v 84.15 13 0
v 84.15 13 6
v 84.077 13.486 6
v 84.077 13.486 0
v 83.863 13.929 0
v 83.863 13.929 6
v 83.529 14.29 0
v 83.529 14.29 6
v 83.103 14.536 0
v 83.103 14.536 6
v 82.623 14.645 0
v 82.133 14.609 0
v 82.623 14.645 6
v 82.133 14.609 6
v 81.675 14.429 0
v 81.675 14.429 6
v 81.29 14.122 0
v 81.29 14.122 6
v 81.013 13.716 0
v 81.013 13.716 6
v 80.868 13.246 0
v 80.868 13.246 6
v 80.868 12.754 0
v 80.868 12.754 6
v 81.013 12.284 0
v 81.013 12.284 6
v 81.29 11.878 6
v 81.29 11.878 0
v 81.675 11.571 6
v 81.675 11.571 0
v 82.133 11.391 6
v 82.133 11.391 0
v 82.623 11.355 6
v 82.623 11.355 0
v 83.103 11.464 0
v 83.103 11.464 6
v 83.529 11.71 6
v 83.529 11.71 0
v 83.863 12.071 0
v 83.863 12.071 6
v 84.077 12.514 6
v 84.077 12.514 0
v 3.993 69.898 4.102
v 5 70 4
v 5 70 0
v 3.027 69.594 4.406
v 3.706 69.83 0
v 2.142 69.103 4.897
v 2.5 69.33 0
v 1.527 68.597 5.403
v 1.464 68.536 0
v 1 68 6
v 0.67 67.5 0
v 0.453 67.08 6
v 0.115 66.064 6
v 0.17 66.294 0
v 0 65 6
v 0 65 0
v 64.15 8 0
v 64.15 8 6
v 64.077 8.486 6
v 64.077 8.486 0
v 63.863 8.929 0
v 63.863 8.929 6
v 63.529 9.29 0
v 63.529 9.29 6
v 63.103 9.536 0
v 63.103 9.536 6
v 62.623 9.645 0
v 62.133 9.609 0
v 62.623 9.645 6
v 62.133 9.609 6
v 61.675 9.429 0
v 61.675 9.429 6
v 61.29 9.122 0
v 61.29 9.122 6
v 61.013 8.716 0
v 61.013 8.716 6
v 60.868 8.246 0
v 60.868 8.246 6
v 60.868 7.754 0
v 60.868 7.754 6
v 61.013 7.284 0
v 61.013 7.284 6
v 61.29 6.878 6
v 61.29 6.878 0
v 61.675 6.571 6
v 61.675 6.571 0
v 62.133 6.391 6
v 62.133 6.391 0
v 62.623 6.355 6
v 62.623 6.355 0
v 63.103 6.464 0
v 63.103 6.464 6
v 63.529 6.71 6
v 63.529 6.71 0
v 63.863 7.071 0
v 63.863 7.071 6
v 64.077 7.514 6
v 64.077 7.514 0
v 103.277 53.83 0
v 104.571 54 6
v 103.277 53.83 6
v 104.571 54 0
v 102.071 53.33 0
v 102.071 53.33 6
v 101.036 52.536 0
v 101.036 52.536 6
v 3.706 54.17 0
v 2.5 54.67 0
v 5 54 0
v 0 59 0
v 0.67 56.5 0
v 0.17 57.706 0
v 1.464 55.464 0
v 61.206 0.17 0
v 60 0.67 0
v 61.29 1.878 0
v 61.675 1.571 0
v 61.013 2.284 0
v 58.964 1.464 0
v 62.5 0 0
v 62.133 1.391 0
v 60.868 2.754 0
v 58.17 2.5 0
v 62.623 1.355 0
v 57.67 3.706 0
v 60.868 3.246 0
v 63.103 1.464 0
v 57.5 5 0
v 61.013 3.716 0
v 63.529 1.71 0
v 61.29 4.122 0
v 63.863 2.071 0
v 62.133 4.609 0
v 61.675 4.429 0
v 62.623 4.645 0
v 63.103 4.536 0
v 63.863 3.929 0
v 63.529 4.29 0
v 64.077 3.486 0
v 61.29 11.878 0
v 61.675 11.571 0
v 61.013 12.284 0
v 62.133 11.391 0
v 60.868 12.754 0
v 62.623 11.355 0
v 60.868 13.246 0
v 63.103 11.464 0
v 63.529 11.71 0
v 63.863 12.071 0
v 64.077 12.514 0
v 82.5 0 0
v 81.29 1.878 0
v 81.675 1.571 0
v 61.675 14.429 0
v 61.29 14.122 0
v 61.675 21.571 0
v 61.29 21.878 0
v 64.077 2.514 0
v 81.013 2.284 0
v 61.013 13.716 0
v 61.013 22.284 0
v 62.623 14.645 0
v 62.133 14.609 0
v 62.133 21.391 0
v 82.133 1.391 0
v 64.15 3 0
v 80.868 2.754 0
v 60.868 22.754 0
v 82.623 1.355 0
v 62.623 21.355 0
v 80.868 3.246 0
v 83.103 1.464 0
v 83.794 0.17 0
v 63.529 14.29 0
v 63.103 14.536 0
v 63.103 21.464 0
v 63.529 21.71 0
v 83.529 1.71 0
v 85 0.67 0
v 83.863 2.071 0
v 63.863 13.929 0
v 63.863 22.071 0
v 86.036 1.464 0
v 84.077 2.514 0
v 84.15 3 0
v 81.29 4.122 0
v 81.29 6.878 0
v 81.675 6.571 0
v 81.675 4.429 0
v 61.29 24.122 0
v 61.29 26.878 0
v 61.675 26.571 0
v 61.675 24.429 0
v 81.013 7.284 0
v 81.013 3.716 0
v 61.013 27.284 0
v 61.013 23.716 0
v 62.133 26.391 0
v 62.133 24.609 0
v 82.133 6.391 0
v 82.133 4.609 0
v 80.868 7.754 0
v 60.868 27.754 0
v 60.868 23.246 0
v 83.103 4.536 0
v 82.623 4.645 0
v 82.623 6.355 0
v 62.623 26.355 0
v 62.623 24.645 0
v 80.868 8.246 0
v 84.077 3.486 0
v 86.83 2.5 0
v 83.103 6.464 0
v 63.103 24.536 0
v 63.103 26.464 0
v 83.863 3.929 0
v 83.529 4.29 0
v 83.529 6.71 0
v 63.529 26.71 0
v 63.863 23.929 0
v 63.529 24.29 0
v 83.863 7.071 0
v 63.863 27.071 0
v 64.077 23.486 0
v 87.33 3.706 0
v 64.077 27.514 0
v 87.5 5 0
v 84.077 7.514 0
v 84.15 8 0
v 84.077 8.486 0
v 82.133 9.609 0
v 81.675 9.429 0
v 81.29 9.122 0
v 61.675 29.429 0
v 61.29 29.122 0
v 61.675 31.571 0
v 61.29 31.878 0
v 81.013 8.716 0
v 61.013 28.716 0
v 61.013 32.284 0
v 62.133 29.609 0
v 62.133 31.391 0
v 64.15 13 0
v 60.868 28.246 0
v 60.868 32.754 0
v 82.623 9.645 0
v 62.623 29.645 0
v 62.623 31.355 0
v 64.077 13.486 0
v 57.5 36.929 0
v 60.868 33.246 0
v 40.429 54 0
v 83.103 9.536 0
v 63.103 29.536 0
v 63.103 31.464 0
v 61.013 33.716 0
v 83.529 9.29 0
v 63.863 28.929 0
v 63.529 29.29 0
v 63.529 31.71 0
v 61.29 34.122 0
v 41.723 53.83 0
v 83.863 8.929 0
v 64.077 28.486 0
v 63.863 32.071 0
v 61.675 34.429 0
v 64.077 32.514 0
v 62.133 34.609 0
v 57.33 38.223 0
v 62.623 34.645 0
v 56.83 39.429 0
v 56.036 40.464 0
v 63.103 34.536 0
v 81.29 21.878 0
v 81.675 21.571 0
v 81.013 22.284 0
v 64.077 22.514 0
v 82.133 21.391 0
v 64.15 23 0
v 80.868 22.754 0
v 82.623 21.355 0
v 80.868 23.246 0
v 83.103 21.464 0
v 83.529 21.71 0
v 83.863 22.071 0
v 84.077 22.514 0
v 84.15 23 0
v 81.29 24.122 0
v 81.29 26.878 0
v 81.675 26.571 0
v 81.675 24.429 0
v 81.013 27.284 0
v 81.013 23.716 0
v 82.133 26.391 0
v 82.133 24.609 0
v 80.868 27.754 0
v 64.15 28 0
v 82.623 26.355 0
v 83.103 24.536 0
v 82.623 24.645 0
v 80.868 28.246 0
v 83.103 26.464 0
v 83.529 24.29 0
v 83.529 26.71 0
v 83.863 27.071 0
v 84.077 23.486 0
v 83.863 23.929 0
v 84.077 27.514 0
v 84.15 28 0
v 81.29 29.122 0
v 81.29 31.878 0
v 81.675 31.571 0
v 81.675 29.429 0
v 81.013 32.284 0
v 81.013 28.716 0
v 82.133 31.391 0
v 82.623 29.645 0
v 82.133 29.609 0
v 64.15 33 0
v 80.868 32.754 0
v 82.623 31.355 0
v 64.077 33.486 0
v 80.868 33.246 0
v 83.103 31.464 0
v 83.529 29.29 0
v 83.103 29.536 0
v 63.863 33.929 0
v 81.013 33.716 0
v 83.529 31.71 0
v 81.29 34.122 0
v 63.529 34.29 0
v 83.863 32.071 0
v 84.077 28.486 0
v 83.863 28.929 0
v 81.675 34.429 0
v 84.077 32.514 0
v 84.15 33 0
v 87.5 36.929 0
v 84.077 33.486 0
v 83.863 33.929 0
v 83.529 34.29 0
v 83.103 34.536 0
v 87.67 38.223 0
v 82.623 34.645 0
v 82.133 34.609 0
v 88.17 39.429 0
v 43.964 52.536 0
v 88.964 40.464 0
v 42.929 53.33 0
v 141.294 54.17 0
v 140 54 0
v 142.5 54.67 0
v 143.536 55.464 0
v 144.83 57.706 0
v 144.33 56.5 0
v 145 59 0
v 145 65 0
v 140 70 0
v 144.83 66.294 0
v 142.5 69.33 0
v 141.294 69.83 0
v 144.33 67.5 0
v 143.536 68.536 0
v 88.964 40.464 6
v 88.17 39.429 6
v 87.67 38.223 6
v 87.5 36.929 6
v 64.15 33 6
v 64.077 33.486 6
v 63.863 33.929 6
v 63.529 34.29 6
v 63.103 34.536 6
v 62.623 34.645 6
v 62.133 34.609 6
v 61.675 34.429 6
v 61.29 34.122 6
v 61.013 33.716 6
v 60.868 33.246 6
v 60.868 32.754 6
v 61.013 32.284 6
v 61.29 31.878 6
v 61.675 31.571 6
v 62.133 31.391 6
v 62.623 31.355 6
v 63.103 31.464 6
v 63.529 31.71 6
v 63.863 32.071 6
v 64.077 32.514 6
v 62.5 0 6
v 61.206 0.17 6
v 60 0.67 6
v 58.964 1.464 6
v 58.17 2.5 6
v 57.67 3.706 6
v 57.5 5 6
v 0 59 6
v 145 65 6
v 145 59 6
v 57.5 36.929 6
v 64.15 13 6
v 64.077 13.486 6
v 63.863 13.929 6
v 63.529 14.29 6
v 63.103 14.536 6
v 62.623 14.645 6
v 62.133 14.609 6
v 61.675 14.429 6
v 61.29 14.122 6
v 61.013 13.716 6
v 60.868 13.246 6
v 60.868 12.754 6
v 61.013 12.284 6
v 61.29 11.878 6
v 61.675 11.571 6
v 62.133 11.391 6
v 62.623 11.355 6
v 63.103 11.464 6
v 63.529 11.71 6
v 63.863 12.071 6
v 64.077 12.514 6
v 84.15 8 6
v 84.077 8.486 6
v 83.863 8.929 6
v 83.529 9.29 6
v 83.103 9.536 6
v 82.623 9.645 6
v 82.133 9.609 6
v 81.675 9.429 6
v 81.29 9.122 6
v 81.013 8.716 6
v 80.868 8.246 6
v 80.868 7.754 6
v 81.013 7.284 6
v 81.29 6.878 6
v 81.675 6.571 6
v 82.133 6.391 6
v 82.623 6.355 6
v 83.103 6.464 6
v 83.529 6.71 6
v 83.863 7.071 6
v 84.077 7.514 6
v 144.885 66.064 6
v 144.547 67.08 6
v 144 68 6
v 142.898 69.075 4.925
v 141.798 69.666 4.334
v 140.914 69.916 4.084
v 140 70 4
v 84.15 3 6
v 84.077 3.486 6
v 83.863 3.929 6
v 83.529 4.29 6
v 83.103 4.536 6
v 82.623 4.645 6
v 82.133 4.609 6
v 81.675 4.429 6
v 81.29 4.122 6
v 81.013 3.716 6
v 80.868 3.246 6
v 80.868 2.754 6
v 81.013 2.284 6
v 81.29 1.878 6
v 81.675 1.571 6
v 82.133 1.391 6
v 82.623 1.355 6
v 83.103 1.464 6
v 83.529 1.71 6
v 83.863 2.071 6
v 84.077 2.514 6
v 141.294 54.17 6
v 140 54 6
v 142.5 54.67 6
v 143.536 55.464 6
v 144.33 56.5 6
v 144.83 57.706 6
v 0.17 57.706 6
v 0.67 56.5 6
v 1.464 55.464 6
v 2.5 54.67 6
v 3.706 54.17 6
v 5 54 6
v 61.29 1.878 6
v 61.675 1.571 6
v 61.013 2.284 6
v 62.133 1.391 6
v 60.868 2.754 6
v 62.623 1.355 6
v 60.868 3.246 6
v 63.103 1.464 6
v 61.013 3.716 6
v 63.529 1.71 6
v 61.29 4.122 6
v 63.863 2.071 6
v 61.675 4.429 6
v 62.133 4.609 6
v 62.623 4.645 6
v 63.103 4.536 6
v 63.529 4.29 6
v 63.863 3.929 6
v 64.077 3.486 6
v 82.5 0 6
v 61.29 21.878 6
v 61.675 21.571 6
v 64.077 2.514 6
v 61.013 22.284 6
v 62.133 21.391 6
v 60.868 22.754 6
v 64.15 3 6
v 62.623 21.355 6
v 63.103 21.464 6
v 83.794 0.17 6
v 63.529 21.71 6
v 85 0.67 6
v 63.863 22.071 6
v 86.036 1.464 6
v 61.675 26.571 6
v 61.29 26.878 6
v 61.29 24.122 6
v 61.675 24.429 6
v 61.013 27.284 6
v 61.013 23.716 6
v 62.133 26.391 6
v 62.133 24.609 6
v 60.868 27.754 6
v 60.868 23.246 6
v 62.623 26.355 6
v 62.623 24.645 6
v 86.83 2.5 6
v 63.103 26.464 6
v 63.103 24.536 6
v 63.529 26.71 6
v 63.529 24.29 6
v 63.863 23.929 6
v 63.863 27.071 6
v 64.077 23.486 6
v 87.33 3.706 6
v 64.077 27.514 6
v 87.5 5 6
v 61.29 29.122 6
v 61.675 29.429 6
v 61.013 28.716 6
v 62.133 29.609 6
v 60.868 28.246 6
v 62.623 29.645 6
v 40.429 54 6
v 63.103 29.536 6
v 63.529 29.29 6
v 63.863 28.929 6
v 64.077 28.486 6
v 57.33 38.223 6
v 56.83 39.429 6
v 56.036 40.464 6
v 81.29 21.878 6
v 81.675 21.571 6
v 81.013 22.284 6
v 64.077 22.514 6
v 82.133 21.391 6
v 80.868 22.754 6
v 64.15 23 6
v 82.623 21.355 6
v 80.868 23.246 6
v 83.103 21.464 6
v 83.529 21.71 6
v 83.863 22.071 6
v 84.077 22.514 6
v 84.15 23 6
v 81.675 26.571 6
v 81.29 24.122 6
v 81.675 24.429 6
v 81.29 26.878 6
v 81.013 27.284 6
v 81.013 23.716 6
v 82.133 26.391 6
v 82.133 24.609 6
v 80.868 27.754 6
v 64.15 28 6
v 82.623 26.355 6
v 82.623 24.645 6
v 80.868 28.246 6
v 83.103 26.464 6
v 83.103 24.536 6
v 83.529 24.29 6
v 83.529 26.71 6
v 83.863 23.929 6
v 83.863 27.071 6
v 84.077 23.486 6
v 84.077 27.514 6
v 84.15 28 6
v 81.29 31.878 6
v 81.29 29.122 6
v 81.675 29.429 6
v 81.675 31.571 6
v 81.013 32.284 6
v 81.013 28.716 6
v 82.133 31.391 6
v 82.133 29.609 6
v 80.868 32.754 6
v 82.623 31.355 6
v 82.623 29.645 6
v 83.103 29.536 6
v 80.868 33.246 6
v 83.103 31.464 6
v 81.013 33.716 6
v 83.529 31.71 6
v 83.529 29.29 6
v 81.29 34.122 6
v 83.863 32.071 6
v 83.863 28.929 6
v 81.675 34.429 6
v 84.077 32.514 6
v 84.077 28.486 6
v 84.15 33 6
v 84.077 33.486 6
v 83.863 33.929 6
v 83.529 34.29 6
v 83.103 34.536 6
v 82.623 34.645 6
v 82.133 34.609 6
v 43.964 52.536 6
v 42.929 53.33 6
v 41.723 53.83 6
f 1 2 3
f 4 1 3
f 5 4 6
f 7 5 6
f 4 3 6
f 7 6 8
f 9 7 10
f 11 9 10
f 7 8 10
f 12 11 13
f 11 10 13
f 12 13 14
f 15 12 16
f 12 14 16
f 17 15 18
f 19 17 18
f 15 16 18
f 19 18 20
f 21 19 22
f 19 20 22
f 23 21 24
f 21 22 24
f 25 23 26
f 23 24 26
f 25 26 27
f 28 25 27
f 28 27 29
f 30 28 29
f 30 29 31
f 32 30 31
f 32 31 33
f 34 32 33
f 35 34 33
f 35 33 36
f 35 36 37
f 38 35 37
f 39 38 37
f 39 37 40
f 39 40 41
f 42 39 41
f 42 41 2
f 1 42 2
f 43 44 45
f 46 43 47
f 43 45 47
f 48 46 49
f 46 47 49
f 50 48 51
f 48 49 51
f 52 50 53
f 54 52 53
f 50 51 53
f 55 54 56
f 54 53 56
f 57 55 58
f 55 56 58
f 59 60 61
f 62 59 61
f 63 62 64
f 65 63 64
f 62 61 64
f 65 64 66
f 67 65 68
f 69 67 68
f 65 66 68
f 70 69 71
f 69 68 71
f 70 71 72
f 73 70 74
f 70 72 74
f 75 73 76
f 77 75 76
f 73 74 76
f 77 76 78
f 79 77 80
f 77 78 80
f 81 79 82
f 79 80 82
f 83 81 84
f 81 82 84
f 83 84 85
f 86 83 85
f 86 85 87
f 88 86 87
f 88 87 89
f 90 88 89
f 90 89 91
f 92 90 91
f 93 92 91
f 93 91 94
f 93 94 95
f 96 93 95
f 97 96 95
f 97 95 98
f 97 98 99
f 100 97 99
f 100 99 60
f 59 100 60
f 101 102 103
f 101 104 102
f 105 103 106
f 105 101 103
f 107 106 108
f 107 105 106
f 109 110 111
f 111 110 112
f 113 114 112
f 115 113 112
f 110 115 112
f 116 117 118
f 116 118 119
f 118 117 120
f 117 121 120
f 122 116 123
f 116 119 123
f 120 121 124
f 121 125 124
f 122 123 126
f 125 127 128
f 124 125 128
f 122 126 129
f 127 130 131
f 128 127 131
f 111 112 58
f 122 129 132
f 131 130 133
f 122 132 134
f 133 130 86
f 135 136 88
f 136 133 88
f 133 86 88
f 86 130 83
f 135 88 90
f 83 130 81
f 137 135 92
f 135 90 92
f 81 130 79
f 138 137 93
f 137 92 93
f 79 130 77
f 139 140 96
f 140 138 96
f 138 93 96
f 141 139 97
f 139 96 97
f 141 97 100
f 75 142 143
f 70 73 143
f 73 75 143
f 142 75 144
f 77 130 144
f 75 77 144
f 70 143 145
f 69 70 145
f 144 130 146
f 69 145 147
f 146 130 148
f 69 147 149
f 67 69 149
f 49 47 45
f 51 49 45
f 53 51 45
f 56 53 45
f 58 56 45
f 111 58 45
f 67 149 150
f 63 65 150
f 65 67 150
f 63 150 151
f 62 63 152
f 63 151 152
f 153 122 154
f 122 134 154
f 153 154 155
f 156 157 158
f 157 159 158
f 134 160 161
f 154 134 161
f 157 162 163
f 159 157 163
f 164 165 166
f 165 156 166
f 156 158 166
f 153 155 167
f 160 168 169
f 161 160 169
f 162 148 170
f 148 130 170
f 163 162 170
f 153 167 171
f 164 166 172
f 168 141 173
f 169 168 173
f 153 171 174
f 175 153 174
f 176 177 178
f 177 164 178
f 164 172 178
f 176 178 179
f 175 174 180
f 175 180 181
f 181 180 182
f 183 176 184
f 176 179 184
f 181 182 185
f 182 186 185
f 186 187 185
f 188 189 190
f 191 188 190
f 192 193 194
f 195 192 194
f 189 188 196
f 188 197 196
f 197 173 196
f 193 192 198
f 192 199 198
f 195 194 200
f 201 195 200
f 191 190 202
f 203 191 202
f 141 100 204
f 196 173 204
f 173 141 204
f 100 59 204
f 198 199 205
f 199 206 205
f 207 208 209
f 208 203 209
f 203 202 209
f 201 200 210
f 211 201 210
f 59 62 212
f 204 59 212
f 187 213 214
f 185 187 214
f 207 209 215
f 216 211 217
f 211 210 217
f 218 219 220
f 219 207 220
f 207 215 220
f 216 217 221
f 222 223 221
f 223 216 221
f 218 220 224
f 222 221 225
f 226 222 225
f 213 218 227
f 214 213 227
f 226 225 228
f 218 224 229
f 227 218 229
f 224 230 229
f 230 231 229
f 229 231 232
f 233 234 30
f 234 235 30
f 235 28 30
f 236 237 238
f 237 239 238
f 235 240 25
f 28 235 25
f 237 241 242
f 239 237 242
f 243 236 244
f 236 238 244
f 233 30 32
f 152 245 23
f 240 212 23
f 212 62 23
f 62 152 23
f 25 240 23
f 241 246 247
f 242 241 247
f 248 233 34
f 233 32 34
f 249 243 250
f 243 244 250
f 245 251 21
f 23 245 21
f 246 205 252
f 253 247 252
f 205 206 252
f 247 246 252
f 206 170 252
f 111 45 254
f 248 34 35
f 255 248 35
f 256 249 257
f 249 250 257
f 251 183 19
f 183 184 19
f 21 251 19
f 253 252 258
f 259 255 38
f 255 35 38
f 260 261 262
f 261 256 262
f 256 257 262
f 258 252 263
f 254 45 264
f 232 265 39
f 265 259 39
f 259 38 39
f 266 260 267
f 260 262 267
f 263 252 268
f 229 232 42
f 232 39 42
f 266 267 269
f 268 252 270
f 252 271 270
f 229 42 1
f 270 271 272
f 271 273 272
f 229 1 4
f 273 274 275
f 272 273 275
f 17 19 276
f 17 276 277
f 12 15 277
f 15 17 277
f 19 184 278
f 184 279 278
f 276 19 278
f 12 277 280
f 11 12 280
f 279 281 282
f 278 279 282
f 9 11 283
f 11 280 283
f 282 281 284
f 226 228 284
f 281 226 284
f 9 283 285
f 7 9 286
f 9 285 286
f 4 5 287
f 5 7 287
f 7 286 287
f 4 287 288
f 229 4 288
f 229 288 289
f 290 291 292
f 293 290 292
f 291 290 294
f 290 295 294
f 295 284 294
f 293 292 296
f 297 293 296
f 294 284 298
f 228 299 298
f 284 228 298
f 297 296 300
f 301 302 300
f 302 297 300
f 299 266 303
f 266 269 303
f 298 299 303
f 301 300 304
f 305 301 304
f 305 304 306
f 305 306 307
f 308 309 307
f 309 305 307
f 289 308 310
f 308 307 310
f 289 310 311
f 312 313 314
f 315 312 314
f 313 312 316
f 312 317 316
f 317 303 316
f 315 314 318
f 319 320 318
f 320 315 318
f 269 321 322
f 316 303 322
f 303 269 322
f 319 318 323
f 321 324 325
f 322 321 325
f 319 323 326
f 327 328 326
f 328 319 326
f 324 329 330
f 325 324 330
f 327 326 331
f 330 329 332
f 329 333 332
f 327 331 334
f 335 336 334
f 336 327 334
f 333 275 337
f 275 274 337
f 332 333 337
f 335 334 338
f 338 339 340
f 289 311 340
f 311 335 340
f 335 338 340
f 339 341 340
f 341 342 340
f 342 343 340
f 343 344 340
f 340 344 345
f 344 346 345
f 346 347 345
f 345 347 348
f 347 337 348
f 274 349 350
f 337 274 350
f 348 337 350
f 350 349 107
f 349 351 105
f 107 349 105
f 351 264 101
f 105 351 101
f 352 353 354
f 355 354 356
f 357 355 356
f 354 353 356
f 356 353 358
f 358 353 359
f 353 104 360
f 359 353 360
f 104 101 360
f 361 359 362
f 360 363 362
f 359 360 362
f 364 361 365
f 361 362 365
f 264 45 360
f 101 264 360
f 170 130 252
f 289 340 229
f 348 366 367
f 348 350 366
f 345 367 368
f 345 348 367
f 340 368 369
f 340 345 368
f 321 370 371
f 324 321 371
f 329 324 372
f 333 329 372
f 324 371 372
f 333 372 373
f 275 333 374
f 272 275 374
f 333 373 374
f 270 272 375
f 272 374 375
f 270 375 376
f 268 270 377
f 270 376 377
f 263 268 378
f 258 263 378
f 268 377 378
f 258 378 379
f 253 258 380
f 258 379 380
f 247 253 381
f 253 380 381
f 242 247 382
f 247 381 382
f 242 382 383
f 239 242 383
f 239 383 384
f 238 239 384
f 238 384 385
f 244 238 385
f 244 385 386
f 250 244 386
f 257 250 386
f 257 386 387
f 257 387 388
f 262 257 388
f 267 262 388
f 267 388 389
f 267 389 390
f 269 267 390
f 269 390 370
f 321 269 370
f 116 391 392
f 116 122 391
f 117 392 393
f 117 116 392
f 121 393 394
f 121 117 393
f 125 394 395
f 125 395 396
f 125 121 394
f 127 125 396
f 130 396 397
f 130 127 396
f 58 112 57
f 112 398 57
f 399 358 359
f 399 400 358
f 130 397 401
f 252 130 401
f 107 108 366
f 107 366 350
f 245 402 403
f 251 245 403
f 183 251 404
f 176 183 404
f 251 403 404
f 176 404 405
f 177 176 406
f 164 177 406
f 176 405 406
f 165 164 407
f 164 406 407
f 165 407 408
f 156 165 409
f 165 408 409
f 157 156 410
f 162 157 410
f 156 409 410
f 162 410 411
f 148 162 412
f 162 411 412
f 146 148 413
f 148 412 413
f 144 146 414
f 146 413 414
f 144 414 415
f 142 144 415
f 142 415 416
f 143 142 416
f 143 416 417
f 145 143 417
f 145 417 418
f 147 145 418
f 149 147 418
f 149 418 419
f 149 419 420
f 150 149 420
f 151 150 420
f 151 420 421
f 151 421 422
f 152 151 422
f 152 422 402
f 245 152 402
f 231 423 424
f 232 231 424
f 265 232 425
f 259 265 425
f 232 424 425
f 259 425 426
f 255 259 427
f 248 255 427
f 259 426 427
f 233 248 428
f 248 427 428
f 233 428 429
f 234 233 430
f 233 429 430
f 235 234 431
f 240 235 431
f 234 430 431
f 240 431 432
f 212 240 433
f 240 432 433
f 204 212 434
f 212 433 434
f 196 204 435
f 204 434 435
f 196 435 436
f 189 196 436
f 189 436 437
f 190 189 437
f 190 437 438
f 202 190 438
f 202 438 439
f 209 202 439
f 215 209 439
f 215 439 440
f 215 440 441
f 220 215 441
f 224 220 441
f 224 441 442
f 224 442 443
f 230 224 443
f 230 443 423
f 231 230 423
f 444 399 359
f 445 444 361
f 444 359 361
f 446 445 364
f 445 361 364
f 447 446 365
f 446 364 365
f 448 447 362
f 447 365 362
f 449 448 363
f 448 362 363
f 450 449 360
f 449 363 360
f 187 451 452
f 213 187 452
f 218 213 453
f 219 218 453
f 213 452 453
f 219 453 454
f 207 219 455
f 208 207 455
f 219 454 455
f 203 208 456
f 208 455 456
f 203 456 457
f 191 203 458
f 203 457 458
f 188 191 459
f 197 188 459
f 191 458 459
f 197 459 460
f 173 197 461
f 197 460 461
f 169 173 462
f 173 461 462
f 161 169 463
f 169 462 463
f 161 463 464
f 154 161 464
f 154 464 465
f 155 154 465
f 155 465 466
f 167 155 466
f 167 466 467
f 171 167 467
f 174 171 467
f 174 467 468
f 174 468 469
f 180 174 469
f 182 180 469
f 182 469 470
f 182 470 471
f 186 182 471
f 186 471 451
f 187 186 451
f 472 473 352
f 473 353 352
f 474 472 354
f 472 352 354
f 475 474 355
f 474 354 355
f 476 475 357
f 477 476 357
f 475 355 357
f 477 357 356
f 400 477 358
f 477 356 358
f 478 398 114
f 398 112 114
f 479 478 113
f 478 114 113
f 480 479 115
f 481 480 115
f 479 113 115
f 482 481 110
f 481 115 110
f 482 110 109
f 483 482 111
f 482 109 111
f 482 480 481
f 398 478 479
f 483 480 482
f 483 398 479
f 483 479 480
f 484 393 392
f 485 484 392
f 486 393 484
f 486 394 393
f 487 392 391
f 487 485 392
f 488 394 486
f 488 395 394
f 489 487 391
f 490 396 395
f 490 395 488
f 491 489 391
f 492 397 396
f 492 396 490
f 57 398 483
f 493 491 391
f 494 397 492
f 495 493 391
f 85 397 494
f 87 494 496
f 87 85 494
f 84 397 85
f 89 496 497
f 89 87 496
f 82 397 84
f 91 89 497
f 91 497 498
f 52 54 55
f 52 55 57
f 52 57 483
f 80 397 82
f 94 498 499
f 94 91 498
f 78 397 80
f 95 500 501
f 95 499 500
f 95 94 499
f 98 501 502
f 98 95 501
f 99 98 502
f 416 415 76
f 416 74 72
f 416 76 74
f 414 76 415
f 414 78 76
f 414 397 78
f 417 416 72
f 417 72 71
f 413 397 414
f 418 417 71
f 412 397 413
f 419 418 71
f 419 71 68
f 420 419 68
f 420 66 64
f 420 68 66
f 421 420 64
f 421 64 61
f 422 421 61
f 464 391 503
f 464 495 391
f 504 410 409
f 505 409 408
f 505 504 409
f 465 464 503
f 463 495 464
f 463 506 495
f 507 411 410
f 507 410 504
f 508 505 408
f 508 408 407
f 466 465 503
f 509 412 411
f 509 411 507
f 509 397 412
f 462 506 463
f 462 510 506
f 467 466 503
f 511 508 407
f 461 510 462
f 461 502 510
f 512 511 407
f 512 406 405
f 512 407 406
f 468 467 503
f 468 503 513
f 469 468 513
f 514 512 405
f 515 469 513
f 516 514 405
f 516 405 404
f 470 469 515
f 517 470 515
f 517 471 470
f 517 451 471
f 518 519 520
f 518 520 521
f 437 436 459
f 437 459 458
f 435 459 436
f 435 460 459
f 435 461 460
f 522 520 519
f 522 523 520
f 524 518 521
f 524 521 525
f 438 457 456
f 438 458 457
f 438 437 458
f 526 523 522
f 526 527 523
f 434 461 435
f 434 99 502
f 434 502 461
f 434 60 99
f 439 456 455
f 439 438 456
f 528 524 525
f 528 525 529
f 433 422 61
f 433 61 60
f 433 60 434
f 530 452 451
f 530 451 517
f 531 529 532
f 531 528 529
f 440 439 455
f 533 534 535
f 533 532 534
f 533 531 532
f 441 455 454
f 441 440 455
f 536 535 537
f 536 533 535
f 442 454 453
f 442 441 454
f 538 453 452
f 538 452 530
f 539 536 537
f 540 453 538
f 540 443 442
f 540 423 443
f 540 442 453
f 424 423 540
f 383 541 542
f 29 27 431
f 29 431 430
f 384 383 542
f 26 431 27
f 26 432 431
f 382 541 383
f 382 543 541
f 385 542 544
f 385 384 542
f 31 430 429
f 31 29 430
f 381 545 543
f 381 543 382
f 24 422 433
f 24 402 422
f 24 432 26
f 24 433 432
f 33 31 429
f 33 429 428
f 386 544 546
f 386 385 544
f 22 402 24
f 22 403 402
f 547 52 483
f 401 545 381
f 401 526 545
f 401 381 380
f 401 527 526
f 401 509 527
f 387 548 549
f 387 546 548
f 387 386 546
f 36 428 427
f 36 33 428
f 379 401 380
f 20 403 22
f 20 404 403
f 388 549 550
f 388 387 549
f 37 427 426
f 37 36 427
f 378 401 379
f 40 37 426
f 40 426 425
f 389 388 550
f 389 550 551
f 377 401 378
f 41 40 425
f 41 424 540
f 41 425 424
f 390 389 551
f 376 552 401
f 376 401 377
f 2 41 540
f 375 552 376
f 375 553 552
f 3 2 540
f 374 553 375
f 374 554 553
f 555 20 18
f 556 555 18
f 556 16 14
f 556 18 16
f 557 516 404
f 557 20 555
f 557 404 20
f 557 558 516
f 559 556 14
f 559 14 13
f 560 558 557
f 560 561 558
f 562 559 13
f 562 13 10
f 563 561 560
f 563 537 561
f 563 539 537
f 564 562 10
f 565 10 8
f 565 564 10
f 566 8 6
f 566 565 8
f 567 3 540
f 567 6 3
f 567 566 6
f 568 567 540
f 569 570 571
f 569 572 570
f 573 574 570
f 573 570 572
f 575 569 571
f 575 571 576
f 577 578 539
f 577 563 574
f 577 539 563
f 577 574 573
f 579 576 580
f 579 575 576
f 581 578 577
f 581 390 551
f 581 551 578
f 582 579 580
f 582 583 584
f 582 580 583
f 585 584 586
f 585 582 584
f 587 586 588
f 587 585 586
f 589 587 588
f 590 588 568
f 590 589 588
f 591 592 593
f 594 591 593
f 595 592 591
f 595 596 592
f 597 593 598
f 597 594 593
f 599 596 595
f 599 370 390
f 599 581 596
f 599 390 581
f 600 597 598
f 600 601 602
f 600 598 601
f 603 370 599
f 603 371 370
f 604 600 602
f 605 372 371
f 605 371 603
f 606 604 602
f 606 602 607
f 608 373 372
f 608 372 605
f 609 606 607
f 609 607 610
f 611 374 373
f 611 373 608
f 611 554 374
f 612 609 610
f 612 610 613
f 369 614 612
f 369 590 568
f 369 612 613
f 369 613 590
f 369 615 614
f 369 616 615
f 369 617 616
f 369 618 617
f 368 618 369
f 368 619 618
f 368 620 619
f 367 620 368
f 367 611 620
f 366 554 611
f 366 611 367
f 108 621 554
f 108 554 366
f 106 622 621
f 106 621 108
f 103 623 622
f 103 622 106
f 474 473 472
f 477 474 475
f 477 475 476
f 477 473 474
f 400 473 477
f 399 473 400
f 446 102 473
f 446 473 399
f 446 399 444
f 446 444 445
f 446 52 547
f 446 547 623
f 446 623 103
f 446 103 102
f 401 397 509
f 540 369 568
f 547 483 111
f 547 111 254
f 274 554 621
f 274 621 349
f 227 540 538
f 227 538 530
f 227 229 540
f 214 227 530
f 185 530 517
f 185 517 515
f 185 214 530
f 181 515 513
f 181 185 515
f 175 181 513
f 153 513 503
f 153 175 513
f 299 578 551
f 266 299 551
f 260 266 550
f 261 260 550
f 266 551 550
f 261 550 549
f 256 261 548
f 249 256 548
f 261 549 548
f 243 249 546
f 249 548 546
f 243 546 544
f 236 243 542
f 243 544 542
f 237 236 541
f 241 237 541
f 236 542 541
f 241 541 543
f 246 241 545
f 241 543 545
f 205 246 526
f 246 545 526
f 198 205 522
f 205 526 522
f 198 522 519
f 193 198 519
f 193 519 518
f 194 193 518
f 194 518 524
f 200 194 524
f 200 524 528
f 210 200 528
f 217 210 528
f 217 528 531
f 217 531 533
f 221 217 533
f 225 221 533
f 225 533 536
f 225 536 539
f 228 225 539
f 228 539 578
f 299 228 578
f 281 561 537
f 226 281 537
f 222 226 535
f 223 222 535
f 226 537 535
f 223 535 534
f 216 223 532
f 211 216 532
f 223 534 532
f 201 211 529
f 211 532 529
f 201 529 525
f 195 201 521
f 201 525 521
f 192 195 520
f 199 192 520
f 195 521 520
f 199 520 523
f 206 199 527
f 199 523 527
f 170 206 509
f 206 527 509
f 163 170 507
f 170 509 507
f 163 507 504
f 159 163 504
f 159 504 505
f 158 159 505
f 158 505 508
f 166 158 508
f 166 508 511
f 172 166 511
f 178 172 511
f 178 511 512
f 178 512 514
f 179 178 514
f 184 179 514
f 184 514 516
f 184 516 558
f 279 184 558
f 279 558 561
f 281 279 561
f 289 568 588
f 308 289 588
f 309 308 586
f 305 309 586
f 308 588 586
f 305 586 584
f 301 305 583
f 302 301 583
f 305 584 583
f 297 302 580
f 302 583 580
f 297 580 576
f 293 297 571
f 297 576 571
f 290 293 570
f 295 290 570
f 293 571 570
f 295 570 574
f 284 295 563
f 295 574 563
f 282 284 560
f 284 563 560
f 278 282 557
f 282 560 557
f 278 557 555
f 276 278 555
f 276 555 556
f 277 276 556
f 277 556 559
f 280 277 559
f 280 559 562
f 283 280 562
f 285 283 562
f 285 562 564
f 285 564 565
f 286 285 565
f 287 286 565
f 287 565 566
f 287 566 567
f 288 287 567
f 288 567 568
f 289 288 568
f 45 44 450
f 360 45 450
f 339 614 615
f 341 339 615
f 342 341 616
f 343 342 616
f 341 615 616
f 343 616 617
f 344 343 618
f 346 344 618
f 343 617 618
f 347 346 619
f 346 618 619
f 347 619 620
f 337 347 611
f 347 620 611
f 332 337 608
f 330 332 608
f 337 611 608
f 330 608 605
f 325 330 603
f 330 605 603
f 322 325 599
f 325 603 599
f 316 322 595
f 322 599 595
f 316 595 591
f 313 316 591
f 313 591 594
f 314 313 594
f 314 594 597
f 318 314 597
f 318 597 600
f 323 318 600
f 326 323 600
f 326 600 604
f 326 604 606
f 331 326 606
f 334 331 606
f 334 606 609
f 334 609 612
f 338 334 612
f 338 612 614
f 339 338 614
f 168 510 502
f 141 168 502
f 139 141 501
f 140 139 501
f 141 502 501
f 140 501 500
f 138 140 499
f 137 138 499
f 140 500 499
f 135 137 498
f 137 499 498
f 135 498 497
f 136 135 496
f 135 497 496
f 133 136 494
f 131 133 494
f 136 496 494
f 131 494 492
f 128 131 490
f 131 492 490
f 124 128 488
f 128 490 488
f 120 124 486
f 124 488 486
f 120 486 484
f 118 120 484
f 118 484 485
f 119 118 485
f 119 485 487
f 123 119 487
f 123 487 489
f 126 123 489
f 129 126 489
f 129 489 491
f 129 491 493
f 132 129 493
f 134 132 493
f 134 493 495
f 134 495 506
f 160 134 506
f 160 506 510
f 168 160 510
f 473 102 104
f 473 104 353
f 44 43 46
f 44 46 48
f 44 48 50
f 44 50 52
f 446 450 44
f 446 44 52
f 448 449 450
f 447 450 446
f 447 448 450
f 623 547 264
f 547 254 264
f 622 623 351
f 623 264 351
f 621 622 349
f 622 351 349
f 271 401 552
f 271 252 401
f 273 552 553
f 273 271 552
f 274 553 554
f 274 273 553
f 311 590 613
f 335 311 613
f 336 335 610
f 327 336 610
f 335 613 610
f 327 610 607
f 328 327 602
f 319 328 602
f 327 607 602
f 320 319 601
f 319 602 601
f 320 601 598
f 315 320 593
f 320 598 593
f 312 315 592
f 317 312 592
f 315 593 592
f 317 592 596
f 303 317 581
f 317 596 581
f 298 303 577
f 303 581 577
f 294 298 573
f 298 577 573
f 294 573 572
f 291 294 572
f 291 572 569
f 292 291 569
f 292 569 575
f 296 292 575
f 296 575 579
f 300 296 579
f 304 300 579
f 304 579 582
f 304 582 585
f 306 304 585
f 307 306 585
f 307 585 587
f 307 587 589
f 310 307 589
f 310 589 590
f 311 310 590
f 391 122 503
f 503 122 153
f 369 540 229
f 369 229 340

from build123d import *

# Parameters (mm, degrees)
ESQUISSE1_W                  = 145
ESQUISSE1_H                  = 40
BOSS_EXTRU_1_DEPTH           = 6
ESQUISSE2_R                  = 1.65
ENL_V_MAT_EXTRU_1_DEPTH      = 1
ENL_V_MAT_EXTRU_1_DEPTH_BACK = 7
ESQUISSE3_W                  = 145
ESQUISSE3_H                  = 30
BOSS_EXTRU_2_DEPTH           = 6
CHANFREIN1_SIZE              = 2
ESQUISSE4_W                  = 57.5
ESQUISSE4_H                  = 54
ENL_V_MAT_EXTRU_2_DEPTH      = 1
ENL_V_MAT_EXTRU_2_DEPTH_BACK = 7
CHANFREIN2_SIZE              = 15
CONG_2_R                     = 5


with BuildPart() as part:
    # Esquisse1 → Boss.-Extru.1 (new body)
    with BuildSketch(Plane.XY):
        with Locations((72.5, 20)):
            Rectangle(ESQUISSE1_W, ESQUISSE1_H)
    extrude(amount=BOSS_EXTRU_1_DEPTH)

    # Esquisse2 → Enlèv. mat.-Extru.1 (cut, two sides)
    with BuildSketch(Plane.XY.offset(6)) as enl_v_mat_extru_1_sk:
        with Locations((62.5, 23)):
            Circle(ESQUISSE2_R)
        with Locations((62.5, 3)):
            Circle(ESQUISSE2_R)
        with Locations((82.5, 3)):
            Circle(ESQUISSE2_R)
        with Locations((82.5, 23)):
            Circle(ESQUISSE2_R)
        with Locations((62.5, 28)):
            Circle(ESQUISSE2_R)
        with Locations((62.5, 8)):
            Circle(ESQUISSE2_R)
        with Locations((82.5, 8)):
            Circle(ESQUISSE2_R)
        with Locations((82.5, 28)):
            Circle(ESQUISSE2_R)
        with Locations((62.5, 33)):
            Circle(ESQUISSE2_R)
        with Locations((62.5, 13)):
            Circle(ESQUISSE2_R)
        with Locations((82.5, 13)):
            Circle(ESQUISSE2_R)
        with Locations((82.5, 33)):
            Circle(ESQUISSE2_R)
    extrude(amount=ENL_V_MAT_EXTRU_1_DEPTH, mode=Mode.SUBTRACT)
    extrude(enl_v_mat_extru_1_sk.sketch, amount=-ENL_V_MAT_EXTRU_1_DEPTH_BACK, mode=Mode.SUBTRACT)

    # Esquisse3 → Boss.-Extru.2 (add)
    with BuildSketch(Plane.XY.offset(6)):
        with Locations((72.5, 55)):
            Rectangle(ESQUISSE3_W, ESQUISSE3_H)
    extrude(amount=-BOSS_EXTRU_2_DEPTH)

    # Chanfrein1
    chanfrein1_edges = [part.edges().sort_by_distance(p)[0] for p in [
        (72.5, 70, 6),
    ]]
    chamfer(chanfrein1_edges, length=CHANFREIN1_SIZE)

    # Esquisse4 → Enlèv. mat.-Extru.2 (cut, two sides)
    with BuildSketch(Plane.XY.offset(6)) as enl_v_mat_extru_2_sk:
        with Locations((28.75, 27)):
            Rectangle(ESQUISSE4_W, ESQUISSE4_H)
        with Locations((116.25, 27)):
            Rectangle(ESQUISSE4_W, ESQUISSE4_H)
    extrude(amount=ENL_V_MAT_EXTRU_2_DEPTH, mode=Mode.SUBTRACT)
    extrude(enl_v_mat_extru_2_sk.sketch, amount=-ENL_V_MAT_EXTRU_2_DEPTH_BACK, mode=Mode.SUBTRACT)

    # Chanfrein2
    chanfrein2_edges = [part.edges().sort_by_distance(p)[0] for p in [
        (87.5, 54, 3),
        (57.5, 54, 3),
    ]]
    chamfer(chanfrein2_edges, length=CHANFREIN2_SIZE)

    # Congé2
    cong_2_edges = [part.edges().sort_by_distance(p)[0] for p in [
        (145, 70, 2),
        (145, 54, 3),
        (102.5, 54, 3),
        (87.5, 39, 3),
        (87.5, 0, 3),
        (57.5, 0, 3),
        (57.5, 39, 3),
        (42.5, 54, 3),
        (0, 54, 3),
        (0, 70, 2),
    ]]
    fillet(cong_2_edges, radius=CONG_2_R)


solid = part.part
